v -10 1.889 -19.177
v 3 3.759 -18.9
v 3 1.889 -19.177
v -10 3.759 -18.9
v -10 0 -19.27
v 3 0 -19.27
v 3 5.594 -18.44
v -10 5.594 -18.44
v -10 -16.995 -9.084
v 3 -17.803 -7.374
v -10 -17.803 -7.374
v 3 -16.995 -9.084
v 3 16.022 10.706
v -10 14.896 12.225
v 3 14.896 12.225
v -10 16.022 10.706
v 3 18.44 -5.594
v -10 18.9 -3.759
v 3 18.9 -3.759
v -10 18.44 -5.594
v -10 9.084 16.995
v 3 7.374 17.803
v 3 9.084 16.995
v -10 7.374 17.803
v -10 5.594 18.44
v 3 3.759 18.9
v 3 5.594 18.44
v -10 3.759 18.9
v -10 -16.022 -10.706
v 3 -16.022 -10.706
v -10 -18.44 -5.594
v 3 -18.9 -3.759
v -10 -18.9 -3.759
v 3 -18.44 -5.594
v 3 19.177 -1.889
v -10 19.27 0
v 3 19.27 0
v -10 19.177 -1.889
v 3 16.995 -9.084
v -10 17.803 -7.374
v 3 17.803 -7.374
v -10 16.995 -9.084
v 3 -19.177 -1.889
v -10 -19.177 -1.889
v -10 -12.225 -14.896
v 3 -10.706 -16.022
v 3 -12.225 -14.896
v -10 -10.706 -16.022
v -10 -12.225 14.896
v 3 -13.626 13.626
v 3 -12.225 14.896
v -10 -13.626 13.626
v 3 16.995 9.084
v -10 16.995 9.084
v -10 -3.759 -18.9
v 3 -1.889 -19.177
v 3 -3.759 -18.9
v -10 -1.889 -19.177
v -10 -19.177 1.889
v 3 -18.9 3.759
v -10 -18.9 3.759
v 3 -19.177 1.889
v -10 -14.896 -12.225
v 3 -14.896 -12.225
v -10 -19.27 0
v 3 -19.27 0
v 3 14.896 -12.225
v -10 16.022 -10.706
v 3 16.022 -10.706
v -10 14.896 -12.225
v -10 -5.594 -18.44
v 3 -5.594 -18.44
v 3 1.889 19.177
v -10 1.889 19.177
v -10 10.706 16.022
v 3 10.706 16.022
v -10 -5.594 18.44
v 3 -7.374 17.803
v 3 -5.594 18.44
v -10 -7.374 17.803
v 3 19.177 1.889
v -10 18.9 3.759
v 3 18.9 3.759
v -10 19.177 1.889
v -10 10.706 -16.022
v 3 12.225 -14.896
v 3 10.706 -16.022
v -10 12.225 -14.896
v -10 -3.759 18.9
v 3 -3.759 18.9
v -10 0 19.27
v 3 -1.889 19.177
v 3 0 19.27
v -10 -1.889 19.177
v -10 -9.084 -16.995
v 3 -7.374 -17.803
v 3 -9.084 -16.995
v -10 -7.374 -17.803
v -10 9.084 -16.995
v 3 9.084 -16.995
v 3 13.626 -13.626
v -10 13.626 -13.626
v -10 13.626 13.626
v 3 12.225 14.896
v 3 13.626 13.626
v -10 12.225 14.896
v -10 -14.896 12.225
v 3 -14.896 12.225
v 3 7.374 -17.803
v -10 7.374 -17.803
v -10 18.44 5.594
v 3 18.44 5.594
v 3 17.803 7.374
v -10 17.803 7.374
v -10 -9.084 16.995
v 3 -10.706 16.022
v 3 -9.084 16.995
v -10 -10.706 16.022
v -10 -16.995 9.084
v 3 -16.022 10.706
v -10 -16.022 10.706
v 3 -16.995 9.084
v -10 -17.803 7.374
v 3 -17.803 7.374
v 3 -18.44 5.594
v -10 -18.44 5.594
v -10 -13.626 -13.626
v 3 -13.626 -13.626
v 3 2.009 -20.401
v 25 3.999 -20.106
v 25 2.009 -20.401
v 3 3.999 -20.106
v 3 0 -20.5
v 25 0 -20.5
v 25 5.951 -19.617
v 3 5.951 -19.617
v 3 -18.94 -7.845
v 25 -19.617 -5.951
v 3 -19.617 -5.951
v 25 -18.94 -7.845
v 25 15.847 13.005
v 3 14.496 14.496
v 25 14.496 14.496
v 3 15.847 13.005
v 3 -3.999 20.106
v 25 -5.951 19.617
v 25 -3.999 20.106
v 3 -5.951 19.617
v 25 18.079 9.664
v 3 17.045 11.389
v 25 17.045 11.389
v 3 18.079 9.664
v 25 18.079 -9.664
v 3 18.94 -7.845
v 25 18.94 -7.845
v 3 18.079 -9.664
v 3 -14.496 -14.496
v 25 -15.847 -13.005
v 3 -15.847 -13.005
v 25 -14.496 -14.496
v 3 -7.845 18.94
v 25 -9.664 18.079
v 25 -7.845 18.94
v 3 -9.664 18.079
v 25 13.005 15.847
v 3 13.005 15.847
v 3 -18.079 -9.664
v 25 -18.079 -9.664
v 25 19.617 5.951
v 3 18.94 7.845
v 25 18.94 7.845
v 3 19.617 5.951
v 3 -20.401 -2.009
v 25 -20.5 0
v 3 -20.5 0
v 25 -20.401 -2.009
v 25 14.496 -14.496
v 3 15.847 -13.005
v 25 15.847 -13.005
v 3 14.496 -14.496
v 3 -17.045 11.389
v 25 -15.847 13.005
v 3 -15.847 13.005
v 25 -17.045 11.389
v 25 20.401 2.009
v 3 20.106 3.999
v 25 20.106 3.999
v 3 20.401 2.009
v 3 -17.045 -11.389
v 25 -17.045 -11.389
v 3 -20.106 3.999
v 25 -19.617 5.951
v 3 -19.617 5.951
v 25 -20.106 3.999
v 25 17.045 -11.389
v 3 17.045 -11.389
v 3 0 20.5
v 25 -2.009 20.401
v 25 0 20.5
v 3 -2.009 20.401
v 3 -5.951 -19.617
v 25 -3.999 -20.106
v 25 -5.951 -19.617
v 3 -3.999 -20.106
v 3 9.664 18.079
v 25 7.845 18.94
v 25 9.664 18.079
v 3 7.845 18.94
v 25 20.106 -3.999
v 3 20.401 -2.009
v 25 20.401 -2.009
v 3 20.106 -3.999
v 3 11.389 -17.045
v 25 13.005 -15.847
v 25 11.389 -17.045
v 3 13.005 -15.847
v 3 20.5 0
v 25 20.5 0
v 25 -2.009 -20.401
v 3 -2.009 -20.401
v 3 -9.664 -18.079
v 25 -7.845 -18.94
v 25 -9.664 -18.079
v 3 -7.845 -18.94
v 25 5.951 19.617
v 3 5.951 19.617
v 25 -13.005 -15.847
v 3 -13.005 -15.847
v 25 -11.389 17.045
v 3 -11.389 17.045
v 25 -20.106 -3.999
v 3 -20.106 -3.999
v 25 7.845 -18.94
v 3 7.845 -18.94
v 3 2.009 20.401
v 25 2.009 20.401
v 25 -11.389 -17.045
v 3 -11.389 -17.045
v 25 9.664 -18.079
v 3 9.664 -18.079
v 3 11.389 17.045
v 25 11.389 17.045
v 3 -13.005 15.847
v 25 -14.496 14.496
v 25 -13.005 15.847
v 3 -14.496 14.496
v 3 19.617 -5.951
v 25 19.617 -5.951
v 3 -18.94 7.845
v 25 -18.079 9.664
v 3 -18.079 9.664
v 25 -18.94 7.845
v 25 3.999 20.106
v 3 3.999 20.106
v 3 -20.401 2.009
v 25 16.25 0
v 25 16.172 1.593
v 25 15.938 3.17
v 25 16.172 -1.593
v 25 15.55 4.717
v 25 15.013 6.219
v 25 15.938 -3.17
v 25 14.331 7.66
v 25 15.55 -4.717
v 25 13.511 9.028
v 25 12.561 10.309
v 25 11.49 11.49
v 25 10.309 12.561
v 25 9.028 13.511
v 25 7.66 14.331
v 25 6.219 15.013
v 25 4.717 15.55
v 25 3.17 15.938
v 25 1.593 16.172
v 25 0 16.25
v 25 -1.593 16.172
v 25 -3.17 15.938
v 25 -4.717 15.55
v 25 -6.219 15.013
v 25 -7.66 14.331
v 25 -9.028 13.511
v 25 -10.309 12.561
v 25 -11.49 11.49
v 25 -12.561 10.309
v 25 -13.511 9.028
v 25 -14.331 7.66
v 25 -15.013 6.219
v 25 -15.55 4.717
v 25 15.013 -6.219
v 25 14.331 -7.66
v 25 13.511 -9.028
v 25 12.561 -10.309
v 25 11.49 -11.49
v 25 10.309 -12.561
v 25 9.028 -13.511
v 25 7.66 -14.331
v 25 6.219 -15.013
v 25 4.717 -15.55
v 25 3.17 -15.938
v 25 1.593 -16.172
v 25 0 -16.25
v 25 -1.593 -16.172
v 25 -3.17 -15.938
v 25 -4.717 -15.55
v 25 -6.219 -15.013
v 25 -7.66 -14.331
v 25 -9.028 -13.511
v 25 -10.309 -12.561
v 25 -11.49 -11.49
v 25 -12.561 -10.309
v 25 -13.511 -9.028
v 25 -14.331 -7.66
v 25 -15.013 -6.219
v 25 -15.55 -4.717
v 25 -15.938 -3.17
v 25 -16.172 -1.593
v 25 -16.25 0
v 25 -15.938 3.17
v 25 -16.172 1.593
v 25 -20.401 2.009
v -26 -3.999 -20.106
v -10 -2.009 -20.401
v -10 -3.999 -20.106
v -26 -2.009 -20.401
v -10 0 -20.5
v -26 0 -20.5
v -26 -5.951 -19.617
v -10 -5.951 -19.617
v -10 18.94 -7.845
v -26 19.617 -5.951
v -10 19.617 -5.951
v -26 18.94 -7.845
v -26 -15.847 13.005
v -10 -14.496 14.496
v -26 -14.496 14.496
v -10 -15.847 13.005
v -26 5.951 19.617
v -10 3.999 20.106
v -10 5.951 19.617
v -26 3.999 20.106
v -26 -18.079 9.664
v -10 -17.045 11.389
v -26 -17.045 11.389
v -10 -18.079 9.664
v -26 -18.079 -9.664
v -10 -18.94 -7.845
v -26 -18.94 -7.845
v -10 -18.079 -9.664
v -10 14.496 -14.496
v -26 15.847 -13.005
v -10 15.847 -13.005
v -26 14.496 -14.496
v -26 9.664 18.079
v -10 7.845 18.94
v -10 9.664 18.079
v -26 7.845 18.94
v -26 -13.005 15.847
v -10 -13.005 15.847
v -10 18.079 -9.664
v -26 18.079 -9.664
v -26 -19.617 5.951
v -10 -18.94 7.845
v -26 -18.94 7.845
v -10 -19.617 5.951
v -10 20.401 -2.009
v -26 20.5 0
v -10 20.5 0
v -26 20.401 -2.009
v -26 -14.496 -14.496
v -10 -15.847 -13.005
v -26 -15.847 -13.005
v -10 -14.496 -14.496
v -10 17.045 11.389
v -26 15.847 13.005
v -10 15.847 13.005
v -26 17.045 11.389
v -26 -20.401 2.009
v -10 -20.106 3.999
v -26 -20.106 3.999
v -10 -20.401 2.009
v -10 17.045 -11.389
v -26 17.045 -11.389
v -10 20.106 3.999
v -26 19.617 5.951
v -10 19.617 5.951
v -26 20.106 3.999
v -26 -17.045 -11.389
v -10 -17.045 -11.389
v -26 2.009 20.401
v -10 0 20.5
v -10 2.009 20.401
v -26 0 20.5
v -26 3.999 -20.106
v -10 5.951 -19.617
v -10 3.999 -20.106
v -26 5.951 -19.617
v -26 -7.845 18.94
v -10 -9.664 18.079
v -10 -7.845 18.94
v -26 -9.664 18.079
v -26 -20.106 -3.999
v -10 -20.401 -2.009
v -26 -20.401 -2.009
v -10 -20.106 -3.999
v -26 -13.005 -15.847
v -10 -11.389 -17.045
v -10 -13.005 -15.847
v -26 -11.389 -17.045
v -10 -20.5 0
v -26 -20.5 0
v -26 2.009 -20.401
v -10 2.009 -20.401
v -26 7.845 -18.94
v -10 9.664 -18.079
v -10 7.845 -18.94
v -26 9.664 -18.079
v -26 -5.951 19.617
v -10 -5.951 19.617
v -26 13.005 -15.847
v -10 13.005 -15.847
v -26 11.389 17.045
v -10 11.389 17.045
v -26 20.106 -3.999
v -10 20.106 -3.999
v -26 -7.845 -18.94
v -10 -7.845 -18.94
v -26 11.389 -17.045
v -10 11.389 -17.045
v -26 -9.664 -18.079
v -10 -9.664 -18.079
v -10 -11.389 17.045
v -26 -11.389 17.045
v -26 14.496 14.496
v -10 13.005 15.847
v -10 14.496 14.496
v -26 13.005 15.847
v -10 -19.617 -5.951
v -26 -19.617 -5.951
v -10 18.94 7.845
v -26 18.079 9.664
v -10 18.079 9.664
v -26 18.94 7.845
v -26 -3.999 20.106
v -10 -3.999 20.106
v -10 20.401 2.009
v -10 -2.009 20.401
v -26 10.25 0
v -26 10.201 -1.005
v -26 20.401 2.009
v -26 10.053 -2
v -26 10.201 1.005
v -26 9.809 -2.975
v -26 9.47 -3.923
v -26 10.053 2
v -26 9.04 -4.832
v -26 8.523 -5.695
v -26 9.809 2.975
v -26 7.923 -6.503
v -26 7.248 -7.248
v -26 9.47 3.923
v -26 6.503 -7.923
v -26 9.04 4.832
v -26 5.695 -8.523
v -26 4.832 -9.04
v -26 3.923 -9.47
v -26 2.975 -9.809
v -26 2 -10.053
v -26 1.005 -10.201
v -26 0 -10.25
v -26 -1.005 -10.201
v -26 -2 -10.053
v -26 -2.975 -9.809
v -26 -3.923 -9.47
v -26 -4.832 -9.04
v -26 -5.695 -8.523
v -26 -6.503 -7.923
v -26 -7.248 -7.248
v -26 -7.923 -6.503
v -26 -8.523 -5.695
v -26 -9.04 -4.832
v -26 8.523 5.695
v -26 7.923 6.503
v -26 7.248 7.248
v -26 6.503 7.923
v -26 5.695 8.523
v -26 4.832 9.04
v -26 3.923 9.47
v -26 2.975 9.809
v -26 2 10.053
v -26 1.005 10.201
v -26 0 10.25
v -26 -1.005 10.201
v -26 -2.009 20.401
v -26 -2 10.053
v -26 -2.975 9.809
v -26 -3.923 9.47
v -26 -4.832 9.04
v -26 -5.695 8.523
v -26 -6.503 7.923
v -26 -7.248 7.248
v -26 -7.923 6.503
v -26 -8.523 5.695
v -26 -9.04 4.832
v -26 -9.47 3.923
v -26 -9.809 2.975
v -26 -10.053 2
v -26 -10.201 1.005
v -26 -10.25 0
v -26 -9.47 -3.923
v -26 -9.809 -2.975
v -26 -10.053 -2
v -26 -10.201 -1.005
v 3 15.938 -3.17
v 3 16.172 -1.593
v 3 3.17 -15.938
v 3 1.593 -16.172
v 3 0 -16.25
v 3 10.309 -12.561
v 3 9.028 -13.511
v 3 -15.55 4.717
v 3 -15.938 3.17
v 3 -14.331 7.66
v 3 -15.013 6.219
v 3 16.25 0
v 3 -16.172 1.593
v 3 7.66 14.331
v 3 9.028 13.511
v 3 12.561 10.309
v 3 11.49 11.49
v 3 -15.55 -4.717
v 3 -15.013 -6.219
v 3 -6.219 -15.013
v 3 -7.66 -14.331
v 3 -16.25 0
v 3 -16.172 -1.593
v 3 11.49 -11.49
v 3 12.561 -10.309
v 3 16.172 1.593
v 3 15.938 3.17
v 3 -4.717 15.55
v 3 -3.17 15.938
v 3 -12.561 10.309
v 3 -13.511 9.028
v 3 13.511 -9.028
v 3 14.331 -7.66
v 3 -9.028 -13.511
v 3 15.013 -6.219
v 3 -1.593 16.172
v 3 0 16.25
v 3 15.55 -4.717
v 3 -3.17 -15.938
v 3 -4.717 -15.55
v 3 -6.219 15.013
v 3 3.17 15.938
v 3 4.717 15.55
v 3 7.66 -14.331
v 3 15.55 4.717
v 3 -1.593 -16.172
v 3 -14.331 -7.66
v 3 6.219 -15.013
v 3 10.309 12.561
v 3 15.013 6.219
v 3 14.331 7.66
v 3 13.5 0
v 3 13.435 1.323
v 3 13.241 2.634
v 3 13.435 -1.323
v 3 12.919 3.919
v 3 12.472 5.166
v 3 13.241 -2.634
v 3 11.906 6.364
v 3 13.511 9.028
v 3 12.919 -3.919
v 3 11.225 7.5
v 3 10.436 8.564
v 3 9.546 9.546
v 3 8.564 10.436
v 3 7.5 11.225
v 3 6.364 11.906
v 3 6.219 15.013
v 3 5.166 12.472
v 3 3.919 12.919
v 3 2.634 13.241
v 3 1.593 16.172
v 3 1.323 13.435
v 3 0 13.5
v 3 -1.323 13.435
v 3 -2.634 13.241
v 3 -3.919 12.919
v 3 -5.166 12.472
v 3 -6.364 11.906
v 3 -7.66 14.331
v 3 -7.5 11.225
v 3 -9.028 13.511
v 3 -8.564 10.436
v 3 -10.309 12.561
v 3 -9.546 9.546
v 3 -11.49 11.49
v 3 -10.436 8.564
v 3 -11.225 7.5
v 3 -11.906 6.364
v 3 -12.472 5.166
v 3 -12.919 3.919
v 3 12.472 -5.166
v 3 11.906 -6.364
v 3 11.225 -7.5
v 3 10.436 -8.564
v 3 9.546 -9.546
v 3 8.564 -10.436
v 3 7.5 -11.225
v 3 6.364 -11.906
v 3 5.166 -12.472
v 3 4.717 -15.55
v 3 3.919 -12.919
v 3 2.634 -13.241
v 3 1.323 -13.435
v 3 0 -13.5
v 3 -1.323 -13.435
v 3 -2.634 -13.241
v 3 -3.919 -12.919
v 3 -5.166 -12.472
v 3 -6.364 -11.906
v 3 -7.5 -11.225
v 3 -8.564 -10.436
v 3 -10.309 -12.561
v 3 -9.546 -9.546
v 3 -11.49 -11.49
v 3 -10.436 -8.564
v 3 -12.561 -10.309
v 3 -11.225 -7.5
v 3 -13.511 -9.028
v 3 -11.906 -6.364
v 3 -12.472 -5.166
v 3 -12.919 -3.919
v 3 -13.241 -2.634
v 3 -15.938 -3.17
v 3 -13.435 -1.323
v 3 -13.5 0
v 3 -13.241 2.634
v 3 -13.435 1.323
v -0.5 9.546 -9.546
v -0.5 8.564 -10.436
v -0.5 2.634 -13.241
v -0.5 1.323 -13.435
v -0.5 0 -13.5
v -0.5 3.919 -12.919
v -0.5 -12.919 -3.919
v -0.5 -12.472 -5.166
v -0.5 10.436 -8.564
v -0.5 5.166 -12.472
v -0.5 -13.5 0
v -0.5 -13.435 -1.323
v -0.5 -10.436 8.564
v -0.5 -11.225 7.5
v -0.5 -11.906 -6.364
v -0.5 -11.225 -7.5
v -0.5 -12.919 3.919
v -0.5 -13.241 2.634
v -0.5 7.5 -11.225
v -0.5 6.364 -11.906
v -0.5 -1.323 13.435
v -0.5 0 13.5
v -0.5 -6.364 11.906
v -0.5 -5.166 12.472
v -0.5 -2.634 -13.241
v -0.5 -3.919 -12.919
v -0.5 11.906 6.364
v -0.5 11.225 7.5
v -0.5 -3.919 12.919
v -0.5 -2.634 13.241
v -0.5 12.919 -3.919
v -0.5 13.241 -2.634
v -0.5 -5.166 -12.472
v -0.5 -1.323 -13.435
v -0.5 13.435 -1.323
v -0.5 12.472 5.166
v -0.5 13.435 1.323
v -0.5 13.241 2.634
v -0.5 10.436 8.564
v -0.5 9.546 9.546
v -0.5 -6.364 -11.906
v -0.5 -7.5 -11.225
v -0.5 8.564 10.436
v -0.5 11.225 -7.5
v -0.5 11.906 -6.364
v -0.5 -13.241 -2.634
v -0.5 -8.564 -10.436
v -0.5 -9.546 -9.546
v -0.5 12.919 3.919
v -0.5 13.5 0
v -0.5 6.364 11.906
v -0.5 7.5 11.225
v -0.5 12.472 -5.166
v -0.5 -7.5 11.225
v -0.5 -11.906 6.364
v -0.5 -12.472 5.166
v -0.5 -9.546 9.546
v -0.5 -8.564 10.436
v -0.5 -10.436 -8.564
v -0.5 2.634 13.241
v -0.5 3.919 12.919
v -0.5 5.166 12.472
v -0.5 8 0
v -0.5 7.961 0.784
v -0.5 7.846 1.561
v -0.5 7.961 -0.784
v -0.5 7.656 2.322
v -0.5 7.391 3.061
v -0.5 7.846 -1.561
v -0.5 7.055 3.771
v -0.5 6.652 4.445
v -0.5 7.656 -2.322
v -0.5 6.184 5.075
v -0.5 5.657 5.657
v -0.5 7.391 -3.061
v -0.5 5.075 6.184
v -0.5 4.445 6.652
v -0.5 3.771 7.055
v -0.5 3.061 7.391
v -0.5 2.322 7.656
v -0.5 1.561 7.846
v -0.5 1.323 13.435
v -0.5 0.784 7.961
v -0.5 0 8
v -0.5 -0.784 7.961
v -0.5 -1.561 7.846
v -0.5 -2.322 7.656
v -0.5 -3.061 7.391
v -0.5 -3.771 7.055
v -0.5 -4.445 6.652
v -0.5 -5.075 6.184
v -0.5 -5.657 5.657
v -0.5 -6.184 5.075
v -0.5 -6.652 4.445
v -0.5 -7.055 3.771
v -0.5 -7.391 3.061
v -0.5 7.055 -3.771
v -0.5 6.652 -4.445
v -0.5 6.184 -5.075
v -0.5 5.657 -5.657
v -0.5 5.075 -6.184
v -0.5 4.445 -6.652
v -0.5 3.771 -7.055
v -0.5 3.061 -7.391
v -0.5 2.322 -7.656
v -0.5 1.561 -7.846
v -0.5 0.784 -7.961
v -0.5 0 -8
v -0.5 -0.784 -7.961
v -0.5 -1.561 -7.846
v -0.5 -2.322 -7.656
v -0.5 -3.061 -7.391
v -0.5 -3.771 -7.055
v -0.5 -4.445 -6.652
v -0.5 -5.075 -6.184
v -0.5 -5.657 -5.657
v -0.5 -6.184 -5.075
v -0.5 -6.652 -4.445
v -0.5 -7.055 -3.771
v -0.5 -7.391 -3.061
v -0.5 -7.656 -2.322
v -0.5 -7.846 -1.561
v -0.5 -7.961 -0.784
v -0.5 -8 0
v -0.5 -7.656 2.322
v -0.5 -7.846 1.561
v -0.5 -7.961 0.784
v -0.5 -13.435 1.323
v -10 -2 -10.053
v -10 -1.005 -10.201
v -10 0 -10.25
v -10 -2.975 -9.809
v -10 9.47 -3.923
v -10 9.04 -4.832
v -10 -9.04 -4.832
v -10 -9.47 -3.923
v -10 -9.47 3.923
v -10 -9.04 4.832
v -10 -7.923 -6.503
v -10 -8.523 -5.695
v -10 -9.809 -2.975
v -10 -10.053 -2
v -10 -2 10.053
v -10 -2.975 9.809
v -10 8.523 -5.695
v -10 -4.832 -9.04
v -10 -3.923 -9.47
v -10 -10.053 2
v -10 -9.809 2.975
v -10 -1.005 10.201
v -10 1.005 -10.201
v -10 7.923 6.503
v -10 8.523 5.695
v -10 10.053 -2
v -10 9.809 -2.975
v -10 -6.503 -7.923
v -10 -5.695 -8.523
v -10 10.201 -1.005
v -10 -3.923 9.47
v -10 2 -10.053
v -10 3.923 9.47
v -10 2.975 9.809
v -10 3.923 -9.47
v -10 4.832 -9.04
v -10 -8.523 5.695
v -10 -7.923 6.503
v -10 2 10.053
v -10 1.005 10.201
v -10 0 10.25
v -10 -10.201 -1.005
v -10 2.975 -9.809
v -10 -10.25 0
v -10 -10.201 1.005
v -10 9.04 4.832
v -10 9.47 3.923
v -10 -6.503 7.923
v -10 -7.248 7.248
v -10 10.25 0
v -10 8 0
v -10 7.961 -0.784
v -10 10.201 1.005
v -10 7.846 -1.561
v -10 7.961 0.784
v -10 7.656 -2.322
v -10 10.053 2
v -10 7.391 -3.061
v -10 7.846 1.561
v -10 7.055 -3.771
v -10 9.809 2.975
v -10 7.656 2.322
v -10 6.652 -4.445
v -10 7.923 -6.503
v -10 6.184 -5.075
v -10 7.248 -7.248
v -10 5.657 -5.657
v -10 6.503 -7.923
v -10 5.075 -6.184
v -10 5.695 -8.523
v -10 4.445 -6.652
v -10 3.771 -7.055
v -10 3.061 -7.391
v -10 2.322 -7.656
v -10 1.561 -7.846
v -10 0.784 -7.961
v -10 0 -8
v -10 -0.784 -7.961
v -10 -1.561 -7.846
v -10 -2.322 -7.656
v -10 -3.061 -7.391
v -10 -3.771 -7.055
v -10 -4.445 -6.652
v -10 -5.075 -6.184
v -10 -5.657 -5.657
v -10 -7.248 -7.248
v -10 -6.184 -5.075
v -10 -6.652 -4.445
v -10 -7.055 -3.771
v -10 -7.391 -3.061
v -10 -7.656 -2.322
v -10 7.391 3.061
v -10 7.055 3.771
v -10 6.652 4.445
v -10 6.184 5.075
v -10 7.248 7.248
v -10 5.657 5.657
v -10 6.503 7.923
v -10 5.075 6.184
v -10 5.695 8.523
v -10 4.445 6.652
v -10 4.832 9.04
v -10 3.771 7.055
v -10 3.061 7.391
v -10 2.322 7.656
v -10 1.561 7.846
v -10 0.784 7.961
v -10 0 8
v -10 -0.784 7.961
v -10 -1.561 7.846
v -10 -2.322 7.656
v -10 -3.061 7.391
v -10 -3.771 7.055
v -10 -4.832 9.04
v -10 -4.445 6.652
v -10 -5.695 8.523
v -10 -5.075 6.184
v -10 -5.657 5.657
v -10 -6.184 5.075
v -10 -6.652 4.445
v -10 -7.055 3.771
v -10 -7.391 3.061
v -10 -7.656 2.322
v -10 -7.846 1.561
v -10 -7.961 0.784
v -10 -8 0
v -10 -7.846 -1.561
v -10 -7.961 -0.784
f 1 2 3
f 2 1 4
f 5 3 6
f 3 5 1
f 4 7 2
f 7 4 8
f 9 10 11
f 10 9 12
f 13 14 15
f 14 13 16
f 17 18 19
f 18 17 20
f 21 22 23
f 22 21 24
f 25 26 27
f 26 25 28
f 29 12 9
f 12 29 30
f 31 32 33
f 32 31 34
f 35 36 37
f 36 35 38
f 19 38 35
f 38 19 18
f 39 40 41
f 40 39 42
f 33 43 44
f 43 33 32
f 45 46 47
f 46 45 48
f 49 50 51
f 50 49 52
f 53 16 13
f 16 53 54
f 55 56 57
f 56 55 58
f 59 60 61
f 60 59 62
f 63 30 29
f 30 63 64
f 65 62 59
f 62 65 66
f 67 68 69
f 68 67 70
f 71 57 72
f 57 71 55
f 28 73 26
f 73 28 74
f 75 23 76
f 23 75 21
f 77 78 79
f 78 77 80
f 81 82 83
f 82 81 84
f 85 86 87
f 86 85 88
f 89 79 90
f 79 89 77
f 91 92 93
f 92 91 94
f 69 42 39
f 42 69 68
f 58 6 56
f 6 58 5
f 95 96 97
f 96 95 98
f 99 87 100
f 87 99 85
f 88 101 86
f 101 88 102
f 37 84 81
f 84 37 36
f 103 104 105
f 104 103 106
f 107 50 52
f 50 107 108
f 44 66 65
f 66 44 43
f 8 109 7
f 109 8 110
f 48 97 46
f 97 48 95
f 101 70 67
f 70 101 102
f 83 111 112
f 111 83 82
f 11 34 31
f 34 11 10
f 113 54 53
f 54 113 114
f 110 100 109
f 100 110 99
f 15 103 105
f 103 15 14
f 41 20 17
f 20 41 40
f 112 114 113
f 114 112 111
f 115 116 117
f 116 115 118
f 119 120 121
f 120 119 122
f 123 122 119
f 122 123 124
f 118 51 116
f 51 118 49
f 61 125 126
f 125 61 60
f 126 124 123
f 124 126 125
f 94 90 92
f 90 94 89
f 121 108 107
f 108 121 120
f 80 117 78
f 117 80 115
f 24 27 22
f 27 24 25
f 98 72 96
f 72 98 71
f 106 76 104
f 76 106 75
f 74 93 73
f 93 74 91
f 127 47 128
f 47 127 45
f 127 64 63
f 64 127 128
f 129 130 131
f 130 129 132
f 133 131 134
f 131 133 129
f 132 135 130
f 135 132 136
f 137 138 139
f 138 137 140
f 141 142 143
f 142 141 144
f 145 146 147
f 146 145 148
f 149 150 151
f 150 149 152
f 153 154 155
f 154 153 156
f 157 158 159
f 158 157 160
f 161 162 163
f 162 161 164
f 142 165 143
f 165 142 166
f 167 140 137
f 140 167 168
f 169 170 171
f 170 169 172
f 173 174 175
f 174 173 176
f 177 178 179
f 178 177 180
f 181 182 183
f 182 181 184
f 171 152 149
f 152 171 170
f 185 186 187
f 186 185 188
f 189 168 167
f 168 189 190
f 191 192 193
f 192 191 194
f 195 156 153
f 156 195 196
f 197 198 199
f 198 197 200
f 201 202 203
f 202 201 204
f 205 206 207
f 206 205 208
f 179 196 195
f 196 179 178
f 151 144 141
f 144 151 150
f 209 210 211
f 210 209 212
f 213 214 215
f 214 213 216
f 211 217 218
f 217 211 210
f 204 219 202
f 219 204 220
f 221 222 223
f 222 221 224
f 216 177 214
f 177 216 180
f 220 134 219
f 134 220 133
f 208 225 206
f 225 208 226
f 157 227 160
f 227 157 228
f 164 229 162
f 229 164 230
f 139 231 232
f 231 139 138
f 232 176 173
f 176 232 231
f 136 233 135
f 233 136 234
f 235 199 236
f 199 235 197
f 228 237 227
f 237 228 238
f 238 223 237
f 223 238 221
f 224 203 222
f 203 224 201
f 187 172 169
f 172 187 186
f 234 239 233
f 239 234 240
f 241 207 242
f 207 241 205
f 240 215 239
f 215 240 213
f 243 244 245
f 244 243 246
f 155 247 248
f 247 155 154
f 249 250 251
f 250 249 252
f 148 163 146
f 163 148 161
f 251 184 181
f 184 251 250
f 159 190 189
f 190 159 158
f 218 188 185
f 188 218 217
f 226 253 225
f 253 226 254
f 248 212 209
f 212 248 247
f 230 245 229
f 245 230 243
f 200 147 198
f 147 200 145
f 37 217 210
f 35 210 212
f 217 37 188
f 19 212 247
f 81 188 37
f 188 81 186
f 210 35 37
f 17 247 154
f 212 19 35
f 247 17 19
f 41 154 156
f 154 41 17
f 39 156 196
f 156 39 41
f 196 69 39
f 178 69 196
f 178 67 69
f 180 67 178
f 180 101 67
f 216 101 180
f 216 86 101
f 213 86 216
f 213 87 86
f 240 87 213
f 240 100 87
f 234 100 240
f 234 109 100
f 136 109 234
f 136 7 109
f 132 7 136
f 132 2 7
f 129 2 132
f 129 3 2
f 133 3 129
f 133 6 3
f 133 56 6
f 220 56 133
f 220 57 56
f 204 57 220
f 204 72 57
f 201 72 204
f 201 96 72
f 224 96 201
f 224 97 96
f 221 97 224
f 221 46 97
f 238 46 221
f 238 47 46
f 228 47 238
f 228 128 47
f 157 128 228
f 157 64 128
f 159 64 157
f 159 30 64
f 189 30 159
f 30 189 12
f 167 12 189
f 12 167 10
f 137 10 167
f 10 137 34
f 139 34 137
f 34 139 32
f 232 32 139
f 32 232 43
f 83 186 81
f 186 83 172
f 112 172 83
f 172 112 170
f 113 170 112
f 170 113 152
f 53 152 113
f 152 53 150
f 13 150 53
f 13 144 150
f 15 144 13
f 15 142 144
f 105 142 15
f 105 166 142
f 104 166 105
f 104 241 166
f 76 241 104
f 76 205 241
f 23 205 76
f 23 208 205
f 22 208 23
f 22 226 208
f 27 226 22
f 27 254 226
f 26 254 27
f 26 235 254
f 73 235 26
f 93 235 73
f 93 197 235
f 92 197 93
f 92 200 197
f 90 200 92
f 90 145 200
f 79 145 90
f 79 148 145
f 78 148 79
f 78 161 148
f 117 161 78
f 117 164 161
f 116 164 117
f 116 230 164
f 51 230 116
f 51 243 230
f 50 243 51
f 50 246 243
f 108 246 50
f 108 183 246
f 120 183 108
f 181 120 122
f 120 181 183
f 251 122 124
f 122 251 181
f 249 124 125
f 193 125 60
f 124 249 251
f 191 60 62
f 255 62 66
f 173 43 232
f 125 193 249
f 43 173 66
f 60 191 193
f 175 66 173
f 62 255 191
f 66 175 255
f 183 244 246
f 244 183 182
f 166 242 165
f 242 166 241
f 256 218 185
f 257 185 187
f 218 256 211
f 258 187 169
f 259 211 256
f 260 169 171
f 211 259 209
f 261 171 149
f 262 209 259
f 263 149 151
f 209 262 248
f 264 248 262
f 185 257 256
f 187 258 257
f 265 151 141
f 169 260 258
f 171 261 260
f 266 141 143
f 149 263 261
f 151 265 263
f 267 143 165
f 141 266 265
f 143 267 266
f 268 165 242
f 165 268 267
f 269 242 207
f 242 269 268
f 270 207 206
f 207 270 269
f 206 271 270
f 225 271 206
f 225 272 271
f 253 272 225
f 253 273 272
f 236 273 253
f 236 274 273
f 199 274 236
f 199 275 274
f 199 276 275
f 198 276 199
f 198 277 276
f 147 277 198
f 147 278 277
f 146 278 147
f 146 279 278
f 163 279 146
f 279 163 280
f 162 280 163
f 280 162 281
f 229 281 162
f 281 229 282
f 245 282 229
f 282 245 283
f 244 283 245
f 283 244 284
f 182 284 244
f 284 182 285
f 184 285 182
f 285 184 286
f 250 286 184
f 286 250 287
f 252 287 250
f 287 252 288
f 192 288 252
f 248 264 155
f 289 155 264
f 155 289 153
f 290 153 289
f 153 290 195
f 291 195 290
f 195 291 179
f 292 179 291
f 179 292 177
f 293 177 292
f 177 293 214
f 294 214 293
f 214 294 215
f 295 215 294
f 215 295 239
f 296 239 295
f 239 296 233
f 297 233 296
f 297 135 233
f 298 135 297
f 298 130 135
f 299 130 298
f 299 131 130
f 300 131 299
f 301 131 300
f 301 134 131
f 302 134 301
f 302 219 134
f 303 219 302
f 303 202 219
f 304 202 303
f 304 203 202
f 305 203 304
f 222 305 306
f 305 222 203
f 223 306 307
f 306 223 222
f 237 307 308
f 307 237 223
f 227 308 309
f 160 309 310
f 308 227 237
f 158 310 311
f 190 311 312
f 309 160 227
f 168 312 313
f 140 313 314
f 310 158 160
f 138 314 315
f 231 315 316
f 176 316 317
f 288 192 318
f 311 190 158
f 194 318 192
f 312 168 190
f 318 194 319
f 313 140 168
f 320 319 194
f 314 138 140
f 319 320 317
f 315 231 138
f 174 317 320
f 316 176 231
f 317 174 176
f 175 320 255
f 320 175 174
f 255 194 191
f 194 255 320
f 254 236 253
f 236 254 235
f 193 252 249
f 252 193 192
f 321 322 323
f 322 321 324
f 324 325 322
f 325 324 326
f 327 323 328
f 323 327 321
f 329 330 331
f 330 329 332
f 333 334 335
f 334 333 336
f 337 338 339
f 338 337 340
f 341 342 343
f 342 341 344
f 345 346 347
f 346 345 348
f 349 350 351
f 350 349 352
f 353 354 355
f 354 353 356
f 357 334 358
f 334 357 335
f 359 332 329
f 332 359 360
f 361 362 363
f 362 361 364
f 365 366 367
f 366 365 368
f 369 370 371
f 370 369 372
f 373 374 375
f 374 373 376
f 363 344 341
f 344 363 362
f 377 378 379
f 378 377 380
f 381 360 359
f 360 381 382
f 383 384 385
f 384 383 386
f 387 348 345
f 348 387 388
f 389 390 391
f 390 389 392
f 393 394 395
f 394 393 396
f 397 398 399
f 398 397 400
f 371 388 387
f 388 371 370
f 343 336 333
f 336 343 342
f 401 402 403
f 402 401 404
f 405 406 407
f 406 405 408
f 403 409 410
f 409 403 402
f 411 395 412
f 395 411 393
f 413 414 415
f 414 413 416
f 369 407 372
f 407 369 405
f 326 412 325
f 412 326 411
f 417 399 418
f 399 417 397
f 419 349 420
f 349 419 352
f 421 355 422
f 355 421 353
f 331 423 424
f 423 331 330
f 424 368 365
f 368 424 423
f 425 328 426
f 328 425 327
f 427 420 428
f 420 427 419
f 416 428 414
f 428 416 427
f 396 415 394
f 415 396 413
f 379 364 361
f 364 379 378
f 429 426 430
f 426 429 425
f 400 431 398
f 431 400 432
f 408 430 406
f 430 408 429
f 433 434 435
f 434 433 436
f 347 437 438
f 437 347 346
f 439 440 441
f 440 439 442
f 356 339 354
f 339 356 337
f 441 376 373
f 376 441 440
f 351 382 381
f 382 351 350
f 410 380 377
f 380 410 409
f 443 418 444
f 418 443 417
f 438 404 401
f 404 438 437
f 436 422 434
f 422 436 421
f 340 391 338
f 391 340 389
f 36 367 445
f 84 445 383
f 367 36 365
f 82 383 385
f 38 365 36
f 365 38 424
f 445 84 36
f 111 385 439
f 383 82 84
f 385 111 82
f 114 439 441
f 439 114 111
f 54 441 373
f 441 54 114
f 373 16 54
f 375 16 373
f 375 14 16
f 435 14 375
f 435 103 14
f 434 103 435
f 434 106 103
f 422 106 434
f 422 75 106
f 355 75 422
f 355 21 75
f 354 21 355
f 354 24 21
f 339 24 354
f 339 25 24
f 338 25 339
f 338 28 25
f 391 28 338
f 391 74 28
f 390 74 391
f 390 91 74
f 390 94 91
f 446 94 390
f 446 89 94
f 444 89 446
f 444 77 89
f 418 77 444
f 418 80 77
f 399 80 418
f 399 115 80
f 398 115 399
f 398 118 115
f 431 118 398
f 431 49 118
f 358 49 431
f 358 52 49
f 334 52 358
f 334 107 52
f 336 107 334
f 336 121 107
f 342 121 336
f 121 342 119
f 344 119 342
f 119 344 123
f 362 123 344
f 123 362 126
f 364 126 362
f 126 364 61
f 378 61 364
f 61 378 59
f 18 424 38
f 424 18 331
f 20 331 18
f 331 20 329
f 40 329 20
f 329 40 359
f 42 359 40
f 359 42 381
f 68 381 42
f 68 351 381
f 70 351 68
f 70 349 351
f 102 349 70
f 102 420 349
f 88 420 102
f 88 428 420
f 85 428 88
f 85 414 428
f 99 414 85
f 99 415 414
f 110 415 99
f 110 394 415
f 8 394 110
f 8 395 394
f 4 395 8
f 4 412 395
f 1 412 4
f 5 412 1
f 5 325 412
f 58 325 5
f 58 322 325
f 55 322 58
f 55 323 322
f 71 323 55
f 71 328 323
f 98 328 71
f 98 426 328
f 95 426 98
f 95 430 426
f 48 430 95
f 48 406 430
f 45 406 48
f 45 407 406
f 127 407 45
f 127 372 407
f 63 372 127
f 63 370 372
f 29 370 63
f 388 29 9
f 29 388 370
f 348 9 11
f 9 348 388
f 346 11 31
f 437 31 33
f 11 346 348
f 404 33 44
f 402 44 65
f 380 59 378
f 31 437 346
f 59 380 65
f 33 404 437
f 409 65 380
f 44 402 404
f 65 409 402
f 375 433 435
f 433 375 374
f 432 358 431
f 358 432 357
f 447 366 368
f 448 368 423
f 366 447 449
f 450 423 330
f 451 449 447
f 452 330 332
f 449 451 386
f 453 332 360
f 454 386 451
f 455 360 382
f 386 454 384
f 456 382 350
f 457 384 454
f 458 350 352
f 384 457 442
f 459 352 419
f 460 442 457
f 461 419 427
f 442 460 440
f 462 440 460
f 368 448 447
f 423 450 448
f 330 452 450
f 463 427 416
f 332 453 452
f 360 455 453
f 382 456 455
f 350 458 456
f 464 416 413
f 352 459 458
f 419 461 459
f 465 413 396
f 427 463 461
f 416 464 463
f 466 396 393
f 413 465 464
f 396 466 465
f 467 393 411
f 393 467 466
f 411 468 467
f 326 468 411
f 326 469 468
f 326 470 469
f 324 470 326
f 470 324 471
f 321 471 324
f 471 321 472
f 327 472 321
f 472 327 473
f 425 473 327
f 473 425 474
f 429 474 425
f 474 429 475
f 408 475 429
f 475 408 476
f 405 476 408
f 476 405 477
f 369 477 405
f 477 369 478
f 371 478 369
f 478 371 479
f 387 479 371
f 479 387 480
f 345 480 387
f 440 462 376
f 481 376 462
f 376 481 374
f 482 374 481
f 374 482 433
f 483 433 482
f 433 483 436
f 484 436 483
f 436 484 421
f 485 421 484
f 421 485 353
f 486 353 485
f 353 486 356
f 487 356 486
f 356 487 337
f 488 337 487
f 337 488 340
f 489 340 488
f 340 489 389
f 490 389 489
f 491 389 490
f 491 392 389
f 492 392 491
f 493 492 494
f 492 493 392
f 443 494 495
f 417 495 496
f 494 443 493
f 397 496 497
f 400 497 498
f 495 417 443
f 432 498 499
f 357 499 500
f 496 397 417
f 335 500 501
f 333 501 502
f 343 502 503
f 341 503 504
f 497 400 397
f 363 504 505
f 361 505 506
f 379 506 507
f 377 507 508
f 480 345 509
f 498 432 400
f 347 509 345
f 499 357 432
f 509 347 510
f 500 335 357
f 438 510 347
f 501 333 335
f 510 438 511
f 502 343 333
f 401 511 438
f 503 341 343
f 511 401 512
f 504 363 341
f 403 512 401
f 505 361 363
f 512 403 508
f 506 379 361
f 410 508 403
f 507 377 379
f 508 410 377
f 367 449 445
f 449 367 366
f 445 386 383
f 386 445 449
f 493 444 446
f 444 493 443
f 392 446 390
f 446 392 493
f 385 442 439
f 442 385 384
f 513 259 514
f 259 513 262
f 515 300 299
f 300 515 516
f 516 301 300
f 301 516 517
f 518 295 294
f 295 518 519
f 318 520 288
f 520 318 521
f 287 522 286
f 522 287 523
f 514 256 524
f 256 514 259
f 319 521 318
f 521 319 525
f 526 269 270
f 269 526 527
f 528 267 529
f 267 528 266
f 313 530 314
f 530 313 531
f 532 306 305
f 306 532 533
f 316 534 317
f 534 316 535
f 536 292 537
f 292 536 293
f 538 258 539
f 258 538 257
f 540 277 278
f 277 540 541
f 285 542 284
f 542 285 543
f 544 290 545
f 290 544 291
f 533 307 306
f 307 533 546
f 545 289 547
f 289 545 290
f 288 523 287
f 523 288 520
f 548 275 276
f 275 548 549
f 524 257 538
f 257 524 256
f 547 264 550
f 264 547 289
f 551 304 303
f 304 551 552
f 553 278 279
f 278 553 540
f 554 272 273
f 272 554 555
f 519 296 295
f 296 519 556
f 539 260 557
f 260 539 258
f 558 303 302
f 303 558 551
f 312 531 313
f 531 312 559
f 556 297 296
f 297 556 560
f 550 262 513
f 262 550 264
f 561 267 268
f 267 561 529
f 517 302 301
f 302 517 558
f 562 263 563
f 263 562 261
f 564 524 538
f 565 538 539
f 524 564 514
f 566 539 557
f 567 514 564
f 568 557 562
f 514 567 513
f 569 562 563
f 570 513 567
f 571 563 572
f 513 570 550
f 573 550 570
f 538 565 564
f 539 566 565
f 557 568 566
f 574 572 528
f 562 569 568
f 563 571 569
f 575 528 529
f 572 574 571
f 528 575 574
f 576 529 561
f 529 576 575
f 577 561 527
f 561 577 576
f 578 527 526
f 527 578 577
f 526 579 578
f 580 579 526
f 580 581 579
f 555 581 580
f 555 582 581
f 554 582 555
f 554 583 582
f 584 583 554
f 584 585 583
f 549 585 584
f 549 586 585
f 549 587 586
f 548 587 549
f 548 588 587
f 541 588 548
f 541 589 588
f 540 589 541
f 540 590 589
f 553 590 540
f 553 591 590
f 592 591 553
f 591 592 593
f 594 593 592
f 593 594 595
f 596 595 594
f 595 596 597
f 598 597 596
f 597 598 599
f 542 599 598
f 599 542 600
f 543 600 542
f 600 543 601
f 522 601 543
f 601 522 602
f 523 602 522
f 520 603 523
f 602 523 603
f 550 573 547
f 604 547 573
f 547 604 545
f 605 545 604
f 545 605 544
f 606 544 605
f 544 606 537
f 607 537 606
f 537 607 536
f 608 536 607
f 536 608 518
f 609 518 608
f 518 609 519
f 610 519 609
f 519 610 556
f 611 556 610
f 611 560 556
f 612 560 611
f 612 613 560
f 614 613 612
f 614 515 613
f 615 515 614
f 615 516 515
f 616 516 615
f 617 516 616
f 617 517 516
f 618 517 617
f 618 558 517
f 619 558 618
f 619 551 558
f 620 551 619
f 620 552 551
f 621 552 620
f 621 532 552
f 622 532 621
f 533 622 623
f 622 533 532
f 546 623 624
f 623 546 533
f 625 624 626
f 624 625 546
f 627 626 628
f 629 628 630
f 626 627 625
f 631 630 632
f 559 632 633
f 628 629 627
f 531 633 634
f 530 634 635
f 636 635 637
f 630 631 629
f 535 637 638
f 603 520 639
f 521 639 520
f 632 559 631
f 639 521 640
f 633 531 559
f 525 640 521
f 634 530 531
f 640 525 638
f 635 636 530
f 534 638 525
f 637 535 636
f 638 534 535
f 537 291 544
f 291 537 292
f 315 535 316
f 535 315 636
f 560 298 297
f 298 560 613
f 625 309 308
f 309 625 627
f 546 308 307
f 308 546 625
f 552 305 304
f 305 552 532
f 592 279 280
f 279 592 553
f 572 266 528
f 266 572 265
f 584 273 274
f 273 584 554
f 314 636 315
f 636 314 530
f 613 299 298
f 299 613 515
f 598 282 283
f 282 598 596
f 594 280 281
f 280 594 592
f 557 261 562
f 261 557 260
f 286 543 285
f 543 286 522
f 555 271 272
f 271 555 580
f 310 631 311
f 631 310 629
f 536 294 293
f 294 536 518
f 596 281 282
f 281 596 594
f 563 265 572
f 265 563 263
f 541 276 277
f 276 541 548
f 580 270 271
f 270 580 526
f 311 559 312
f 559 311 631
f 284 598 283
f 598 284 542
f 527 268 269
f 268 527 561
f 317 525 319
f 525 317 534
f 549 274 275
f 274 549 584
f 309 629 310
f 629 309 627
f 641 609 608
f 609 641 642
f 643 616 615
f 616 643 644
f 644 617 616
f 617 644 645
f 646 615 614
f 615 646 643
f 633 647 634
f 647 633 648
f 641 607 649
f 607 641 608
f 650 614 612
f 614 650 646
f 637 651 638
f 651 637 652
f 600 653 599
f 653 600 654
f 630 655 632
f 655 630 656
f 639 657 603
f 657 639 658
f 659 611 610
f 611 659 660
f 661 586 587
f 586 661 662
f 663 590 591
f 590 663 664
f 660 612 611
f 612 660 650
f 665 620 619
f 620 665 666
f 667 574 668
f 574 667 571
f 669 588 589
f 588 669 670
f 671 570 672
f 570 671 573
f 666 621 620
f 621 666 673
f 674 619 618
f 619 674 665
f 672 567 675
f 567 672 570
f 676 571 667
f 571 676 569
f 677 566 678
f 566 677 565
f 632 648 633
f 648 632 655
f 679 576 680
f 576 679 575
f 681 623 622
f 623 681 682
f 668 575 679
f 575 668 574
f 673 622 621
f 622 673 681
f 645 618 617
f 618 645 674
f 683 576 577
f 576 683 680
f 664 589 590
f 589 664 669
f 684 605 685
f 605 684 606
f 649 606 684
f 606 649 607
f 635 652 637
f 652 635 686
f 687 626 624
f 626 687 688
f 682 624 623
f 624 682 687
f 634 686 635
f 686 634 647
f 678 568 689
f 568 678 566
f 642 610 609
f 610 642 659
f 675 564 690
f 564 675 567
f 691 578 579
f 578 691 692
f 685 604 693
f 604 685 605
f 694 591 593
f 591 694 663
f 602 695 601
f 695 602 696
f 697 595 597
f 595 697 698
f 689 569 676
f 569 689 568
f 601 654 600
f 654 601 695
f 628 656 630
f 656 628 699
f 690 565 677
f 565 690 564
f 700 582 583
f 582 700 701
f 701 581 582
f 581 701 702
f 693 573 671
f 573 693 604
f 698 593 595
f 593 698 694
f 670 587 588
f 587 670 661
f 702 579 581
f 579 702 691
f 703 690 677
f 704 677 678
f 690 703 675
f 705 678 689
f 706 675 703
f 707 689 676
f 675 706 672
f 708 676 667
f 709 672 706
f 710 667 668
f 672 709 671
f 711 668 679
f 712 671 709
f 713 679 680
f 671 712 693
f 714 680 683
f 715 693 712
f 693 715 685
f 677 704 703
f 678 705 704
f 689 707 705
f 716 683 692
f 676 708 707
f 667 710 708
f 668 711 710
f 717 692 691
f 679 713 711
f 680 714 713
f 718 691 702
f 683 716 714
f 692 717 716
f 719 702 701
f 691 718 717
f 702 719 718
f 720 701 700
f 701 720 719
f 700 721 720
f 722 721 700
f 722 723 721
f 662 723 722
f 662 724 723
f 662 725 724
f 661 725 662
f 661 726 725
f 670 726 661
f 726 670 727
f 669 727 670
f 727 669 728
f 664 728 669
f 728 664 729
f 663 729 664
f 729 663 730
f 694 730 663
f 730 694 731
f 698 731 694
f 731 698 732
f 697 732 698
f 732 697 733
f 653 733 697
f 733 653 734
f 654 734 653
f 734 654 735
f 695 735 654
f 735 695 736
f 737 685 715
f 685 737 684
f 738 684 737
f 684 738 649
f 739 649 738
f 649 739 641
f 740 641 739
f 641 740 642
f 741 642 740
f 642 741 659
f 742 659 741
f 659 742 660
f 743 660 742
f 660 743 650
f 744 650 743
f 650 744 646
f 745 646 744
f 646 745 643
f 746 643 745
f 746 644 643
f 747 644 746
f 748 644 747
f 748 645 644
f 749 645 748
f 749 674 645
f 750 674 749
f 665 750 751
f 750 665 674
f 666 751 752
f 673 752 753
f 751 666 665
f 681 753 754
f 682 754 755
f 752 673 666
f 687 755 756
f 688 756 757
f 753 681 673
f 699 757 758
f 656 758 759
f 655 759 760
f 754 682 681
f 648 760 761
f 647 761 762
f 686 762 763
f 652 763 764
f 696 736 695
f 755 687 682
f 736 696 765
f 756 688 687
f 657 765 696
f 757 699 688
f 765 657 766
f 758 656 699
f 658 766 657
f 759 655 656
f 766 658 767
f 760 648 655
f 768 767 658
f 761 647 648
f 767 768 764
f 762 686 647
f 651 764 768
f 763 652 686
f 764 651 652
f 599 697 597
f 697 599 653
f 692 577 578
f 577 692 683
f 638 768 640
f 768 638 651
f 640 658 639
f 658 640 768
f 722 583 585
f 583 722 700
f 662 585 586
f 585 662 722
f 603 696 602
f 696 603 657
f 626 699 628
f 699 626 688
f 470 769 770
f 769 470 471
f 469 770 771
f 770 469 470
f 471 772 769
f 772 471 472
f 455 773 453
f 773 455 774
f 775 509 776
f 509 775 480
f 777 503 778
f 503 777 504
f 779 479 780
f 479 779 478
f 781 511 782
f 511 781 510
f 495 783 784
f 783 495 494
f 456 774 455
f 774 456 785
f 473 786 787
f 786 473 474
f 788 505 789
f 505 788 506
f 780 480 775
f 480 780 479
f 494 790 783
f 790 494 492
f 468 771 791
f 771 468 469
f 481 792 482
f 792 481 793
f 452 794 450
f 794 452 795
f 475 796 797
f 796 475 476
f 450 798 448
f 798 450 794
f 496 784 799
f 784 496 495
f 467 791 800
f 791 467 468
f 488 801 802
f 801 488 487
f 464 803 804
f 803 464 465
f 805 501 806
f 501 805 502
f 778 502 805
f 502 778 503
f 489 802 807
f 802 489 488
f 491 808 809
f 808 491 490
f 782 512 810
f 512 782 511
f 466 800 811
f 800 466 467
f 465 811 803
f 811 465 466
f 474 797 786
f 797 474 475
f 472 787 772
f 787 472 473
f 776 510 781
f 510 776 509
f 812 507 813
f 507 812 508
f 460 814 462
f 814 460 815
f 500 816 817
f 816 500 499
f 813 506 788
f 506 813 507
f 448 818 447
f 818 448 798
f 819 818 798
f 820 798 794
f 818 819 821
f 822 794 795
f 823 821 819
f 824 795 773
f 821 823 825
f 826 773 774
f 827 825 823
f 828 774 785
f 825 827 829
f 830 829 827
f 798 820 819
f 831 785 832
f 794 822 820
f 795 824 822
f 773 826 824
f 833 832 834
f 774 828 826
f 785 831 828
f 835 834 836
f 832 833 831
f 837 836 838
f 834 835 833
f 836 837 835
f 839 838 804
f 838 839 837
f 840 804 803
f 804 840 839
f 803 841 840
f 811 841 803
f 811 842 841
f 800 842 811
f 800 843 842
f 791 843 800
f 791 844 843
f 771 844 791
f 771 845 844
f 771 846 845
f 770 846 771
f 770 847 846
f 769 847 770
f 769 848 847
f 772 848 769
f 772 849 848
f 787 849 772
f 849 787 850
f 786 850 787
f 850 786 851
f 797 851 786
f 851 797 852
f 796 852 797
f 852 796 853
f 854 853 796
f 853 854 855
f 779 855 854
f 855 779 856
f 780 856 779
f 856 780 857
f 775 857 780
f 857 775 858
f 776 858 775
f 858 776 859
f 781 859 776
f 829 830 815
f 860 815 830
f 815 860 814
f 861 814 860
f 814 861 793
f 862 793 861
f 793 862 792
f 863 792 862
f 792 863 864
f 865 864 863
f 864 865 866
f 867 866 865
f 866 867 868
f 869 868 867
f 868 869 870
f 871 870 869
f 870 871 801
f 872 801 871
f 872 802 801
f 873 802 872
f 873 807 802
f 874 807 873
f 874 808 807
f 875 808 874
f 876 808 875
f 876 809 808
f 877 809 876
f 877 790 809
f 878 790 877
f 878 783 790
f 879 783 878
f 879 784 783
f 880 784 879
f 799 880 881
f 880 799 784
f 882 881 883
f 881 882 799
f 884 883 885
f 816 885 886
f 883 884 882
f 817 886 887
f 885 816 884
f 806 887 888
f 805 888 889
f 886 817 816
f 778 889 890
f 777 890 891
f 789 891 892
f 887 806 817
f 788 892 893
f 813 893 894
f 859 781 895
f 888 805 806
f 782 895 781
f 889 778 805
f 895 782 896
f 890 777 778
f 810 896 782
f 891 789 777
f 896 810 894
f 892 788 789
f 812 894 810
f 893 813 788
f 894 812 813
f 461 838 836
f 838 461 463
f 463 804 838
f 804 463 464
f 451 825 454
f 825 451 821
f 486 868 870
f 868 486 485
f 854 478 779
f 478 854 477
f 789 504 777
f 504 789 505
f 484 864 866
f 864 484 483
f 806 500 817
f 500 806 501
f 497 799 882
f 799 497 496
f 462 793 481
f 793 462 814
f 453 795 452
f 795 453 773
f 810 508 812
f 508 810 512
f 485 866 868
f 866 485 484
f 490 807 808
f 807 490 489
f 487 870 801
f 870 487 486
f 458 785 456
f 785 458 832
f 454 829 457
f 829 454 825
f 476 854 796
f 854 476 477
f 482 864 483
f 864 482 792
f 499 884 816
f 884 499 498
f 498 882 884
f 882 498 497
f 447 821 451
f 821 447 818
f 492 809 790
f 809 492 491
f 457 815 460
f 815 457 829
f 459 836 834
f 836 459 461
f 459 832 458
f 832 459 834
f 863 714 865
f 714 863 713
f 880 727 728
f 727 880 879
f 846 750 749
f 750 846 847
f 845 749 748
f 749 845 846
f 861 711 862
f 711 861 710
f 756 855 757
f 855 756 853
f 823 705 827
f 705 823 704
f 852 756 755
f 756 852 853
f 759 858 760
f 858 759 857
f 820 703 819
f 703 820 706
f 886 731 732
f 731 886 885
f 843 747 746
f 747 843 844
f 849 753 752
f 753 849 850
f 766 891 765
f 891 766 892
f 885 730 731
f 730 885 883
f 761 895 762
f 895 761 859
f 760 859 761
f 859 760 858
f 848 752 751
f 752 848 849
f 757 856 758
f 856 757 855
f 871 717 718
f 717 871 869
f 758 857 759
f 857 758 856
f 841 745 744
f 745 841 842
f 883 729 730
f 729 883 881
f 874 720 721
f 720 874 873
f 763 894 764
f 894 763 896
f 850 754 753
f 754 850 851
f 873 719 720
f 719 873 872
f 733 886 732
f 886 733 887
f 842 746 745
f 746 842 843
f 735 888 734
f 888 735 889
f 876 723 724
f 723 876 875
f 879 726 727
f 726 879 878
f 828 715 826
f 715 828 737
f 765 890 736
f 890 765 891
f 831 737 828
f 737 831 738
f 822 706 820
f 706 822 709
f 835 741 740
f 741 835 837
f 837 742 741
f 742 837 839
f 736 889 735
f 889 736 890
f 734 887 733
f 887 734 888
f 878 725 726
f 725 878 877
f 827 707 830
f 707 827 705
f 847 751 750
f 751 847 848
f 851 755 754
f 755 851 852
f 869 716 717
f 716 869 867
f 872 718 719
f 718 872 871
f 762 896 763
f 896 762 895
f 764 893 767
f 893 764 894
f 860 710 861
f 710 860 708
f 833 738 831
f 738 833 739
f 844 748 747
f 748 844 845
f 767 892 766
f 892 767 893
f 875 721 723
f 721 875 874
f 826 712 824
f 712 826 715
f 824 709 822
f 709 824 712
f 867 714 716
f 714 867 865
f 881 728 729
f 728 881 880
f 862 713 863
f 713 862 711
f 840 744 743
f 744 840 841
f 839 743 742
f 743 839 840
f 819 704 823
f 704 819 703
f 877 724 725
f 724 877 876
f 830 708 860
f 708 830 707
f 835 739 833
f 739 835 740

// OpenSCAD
// file: ../pipecad.scad
// PipeCAD · librería OpenSCAD de accesorios
// La usan todos los .scad de modelos/serie y modelos/personalizados con:  use <../pipecad.scad>
// Medidas en milímetros. Origen: punto donde se cortan los ejes de todas las bocas.
// Pieza imprimible: cuerpo + embocaduras taladradas (Ø tubo + holgura) + paso interior que une las bocas.
//
// accesorio_pipecad(bocas, variantes, variante, holgura)
//   bocas      [[nombre, [x, y, z]], …]          dirección de cada boca, hacia fuera (no hace falta que sea unitaria)
//   variantes  [[nombre, Ø exterior, [[Ø tubo, Z, embocadura, Ø paso], … una por boca]], …]
//              Z: del origen al tope (fondo) de la embocadura · embocadura: lo que entra el tubo
//   variante   nombre de la variante a generar, p. ej. "32"
//   holgura    holgura radial de las embocaduras (mm)
// La resolución la marca $fn, que se hereda de quien llama.

function pipecad_unidad(v) = v / norm(v);

// Lleva el eje Z local a la dirección v
module pipecad_orientar(v) rotate([0, acos(v.z), atan2(v.y, v.x)]) children();

// Cilindro a lo largo del eje Z local, entre dos distancias al origen
module pipecad_tramo(r, desde, hasta) translate([0, 0, desde]) cylinder(r = r, h = hasta - desde);

module accesorio_pipecad(bocas, variantes, variante, holgura = 0.25) {
  V = variantes[search([variante], variantes, 1, 0)[0]];
  assert(V != undef, str("No existe la variante ", variante));
  R = V[1] / 2;            // radio exterior
  M = V[2];                // medidas de cada boca
  N = len(bocas);
  assert(len(M) == N, str("La variante ", variante, " no tiene medidas para todas las bocas"));
  DIR = [for (b = bocas) pipecad_unidad(b[1])];
  // Hay bocas no alineadas (codos, Tes, cruces): núcleo esférico y cámara central
  RAMIFICADO = N > 1 && max([for (i = [0:N-1]) for (j = [0:N-1]) 1 - abs(DIR[i] * DIR[j])]) > 1e-6;
  PASO_MAX = max([for (m = M) m[3]]);   // Ø del paso más ancho

  difference() {
    union() {
      for (i = [0:N-1]) pipecad_orientar(DIR[i]) {
        pipecad_tramo(R * 0.94, RAMIFICADO ? 0 : -0.5, M[i][1] + 0.6);   // cuerpo de la boca
        pipecad_tramo(R, M[i][1], M[i][1] + M[i][2]);                    // embocadura
      }
      if (RAMIFICADO) sphere(r = R * 0.97);                               // núcleo
    }
    for (i = [0:N-1]) pipecad_orientar(DIR[i]) {
      pipecad_tramo(M[i][0] / 2 + holgura, M[i][1], M[i][1] + M[i][2] + 1);       // taladro de la embocadura
      if (N > 1) pipecad_tramo(M[i][3] / 2, RAMIFICADO ? 0 : -0.5, M[i][1] + 0.5); // paso interior
    }
    if (RAMIFICADO) sphere(r = PASO_MAX / 2 * 1.15);   // cámara central (algo mayor que el paso más ancho)
  }
}
// main file
// PipeCAD · Manguito reductor (reducer)
// Código generado por el editor de accesorios de PipeCAD. Medidas en milímetros.
// Origen: punto donde se cortan los ejes de todas las bocas. Cada boca apunta hacia fuera.
// Pieza imprimible: cuerpo + embocaduras taladradas (Ø tubo + holgura) + paso interior.
// Necesita ../pipecad.scad; «Descargar .scad» del editor la incluye dentro para abrirlo suelto.

/* [Fabricación] */
// Variante a generar
variante = "32-20"; // [32-20, 40-20, 40-32]
// Holgura radial de las embocaduras (mm)
holgura = 0.25; // [0:0.05:0.6]
// Resolución de los círculos (número de lados)
$fn = 64; // [24:8:192]

/* [Hidden] */
// Bocas: [nombre, dirección hacia fuera]
BOCAS = [
  ["A", [1, 0, 0]],
  ["B", [-1, 0, 0]]
];
// Variantes: [nombre, Ø exterior, por boca: [Ø tubo, Z (origen → tope), embocadura, Ø paso]]
VARIANTES = [
  ["32-20", 41, [[32, 3, 22, 27], [20, 10, 16, 16]]],
  ["40-20", 50, [[40, 3, 26, 34], [20, 14, 16, 16]]],
  ["40-32", 50, [[40, 3, 26, 34], [32, 6, 22, 27]]]
];

// Geometría: librería común de PipeCAD (modelos/pipecad.scad)
use <../pipecad.scad>

accesorio_pipecad(BOCAS, VARIANTES, variante, holgura);
